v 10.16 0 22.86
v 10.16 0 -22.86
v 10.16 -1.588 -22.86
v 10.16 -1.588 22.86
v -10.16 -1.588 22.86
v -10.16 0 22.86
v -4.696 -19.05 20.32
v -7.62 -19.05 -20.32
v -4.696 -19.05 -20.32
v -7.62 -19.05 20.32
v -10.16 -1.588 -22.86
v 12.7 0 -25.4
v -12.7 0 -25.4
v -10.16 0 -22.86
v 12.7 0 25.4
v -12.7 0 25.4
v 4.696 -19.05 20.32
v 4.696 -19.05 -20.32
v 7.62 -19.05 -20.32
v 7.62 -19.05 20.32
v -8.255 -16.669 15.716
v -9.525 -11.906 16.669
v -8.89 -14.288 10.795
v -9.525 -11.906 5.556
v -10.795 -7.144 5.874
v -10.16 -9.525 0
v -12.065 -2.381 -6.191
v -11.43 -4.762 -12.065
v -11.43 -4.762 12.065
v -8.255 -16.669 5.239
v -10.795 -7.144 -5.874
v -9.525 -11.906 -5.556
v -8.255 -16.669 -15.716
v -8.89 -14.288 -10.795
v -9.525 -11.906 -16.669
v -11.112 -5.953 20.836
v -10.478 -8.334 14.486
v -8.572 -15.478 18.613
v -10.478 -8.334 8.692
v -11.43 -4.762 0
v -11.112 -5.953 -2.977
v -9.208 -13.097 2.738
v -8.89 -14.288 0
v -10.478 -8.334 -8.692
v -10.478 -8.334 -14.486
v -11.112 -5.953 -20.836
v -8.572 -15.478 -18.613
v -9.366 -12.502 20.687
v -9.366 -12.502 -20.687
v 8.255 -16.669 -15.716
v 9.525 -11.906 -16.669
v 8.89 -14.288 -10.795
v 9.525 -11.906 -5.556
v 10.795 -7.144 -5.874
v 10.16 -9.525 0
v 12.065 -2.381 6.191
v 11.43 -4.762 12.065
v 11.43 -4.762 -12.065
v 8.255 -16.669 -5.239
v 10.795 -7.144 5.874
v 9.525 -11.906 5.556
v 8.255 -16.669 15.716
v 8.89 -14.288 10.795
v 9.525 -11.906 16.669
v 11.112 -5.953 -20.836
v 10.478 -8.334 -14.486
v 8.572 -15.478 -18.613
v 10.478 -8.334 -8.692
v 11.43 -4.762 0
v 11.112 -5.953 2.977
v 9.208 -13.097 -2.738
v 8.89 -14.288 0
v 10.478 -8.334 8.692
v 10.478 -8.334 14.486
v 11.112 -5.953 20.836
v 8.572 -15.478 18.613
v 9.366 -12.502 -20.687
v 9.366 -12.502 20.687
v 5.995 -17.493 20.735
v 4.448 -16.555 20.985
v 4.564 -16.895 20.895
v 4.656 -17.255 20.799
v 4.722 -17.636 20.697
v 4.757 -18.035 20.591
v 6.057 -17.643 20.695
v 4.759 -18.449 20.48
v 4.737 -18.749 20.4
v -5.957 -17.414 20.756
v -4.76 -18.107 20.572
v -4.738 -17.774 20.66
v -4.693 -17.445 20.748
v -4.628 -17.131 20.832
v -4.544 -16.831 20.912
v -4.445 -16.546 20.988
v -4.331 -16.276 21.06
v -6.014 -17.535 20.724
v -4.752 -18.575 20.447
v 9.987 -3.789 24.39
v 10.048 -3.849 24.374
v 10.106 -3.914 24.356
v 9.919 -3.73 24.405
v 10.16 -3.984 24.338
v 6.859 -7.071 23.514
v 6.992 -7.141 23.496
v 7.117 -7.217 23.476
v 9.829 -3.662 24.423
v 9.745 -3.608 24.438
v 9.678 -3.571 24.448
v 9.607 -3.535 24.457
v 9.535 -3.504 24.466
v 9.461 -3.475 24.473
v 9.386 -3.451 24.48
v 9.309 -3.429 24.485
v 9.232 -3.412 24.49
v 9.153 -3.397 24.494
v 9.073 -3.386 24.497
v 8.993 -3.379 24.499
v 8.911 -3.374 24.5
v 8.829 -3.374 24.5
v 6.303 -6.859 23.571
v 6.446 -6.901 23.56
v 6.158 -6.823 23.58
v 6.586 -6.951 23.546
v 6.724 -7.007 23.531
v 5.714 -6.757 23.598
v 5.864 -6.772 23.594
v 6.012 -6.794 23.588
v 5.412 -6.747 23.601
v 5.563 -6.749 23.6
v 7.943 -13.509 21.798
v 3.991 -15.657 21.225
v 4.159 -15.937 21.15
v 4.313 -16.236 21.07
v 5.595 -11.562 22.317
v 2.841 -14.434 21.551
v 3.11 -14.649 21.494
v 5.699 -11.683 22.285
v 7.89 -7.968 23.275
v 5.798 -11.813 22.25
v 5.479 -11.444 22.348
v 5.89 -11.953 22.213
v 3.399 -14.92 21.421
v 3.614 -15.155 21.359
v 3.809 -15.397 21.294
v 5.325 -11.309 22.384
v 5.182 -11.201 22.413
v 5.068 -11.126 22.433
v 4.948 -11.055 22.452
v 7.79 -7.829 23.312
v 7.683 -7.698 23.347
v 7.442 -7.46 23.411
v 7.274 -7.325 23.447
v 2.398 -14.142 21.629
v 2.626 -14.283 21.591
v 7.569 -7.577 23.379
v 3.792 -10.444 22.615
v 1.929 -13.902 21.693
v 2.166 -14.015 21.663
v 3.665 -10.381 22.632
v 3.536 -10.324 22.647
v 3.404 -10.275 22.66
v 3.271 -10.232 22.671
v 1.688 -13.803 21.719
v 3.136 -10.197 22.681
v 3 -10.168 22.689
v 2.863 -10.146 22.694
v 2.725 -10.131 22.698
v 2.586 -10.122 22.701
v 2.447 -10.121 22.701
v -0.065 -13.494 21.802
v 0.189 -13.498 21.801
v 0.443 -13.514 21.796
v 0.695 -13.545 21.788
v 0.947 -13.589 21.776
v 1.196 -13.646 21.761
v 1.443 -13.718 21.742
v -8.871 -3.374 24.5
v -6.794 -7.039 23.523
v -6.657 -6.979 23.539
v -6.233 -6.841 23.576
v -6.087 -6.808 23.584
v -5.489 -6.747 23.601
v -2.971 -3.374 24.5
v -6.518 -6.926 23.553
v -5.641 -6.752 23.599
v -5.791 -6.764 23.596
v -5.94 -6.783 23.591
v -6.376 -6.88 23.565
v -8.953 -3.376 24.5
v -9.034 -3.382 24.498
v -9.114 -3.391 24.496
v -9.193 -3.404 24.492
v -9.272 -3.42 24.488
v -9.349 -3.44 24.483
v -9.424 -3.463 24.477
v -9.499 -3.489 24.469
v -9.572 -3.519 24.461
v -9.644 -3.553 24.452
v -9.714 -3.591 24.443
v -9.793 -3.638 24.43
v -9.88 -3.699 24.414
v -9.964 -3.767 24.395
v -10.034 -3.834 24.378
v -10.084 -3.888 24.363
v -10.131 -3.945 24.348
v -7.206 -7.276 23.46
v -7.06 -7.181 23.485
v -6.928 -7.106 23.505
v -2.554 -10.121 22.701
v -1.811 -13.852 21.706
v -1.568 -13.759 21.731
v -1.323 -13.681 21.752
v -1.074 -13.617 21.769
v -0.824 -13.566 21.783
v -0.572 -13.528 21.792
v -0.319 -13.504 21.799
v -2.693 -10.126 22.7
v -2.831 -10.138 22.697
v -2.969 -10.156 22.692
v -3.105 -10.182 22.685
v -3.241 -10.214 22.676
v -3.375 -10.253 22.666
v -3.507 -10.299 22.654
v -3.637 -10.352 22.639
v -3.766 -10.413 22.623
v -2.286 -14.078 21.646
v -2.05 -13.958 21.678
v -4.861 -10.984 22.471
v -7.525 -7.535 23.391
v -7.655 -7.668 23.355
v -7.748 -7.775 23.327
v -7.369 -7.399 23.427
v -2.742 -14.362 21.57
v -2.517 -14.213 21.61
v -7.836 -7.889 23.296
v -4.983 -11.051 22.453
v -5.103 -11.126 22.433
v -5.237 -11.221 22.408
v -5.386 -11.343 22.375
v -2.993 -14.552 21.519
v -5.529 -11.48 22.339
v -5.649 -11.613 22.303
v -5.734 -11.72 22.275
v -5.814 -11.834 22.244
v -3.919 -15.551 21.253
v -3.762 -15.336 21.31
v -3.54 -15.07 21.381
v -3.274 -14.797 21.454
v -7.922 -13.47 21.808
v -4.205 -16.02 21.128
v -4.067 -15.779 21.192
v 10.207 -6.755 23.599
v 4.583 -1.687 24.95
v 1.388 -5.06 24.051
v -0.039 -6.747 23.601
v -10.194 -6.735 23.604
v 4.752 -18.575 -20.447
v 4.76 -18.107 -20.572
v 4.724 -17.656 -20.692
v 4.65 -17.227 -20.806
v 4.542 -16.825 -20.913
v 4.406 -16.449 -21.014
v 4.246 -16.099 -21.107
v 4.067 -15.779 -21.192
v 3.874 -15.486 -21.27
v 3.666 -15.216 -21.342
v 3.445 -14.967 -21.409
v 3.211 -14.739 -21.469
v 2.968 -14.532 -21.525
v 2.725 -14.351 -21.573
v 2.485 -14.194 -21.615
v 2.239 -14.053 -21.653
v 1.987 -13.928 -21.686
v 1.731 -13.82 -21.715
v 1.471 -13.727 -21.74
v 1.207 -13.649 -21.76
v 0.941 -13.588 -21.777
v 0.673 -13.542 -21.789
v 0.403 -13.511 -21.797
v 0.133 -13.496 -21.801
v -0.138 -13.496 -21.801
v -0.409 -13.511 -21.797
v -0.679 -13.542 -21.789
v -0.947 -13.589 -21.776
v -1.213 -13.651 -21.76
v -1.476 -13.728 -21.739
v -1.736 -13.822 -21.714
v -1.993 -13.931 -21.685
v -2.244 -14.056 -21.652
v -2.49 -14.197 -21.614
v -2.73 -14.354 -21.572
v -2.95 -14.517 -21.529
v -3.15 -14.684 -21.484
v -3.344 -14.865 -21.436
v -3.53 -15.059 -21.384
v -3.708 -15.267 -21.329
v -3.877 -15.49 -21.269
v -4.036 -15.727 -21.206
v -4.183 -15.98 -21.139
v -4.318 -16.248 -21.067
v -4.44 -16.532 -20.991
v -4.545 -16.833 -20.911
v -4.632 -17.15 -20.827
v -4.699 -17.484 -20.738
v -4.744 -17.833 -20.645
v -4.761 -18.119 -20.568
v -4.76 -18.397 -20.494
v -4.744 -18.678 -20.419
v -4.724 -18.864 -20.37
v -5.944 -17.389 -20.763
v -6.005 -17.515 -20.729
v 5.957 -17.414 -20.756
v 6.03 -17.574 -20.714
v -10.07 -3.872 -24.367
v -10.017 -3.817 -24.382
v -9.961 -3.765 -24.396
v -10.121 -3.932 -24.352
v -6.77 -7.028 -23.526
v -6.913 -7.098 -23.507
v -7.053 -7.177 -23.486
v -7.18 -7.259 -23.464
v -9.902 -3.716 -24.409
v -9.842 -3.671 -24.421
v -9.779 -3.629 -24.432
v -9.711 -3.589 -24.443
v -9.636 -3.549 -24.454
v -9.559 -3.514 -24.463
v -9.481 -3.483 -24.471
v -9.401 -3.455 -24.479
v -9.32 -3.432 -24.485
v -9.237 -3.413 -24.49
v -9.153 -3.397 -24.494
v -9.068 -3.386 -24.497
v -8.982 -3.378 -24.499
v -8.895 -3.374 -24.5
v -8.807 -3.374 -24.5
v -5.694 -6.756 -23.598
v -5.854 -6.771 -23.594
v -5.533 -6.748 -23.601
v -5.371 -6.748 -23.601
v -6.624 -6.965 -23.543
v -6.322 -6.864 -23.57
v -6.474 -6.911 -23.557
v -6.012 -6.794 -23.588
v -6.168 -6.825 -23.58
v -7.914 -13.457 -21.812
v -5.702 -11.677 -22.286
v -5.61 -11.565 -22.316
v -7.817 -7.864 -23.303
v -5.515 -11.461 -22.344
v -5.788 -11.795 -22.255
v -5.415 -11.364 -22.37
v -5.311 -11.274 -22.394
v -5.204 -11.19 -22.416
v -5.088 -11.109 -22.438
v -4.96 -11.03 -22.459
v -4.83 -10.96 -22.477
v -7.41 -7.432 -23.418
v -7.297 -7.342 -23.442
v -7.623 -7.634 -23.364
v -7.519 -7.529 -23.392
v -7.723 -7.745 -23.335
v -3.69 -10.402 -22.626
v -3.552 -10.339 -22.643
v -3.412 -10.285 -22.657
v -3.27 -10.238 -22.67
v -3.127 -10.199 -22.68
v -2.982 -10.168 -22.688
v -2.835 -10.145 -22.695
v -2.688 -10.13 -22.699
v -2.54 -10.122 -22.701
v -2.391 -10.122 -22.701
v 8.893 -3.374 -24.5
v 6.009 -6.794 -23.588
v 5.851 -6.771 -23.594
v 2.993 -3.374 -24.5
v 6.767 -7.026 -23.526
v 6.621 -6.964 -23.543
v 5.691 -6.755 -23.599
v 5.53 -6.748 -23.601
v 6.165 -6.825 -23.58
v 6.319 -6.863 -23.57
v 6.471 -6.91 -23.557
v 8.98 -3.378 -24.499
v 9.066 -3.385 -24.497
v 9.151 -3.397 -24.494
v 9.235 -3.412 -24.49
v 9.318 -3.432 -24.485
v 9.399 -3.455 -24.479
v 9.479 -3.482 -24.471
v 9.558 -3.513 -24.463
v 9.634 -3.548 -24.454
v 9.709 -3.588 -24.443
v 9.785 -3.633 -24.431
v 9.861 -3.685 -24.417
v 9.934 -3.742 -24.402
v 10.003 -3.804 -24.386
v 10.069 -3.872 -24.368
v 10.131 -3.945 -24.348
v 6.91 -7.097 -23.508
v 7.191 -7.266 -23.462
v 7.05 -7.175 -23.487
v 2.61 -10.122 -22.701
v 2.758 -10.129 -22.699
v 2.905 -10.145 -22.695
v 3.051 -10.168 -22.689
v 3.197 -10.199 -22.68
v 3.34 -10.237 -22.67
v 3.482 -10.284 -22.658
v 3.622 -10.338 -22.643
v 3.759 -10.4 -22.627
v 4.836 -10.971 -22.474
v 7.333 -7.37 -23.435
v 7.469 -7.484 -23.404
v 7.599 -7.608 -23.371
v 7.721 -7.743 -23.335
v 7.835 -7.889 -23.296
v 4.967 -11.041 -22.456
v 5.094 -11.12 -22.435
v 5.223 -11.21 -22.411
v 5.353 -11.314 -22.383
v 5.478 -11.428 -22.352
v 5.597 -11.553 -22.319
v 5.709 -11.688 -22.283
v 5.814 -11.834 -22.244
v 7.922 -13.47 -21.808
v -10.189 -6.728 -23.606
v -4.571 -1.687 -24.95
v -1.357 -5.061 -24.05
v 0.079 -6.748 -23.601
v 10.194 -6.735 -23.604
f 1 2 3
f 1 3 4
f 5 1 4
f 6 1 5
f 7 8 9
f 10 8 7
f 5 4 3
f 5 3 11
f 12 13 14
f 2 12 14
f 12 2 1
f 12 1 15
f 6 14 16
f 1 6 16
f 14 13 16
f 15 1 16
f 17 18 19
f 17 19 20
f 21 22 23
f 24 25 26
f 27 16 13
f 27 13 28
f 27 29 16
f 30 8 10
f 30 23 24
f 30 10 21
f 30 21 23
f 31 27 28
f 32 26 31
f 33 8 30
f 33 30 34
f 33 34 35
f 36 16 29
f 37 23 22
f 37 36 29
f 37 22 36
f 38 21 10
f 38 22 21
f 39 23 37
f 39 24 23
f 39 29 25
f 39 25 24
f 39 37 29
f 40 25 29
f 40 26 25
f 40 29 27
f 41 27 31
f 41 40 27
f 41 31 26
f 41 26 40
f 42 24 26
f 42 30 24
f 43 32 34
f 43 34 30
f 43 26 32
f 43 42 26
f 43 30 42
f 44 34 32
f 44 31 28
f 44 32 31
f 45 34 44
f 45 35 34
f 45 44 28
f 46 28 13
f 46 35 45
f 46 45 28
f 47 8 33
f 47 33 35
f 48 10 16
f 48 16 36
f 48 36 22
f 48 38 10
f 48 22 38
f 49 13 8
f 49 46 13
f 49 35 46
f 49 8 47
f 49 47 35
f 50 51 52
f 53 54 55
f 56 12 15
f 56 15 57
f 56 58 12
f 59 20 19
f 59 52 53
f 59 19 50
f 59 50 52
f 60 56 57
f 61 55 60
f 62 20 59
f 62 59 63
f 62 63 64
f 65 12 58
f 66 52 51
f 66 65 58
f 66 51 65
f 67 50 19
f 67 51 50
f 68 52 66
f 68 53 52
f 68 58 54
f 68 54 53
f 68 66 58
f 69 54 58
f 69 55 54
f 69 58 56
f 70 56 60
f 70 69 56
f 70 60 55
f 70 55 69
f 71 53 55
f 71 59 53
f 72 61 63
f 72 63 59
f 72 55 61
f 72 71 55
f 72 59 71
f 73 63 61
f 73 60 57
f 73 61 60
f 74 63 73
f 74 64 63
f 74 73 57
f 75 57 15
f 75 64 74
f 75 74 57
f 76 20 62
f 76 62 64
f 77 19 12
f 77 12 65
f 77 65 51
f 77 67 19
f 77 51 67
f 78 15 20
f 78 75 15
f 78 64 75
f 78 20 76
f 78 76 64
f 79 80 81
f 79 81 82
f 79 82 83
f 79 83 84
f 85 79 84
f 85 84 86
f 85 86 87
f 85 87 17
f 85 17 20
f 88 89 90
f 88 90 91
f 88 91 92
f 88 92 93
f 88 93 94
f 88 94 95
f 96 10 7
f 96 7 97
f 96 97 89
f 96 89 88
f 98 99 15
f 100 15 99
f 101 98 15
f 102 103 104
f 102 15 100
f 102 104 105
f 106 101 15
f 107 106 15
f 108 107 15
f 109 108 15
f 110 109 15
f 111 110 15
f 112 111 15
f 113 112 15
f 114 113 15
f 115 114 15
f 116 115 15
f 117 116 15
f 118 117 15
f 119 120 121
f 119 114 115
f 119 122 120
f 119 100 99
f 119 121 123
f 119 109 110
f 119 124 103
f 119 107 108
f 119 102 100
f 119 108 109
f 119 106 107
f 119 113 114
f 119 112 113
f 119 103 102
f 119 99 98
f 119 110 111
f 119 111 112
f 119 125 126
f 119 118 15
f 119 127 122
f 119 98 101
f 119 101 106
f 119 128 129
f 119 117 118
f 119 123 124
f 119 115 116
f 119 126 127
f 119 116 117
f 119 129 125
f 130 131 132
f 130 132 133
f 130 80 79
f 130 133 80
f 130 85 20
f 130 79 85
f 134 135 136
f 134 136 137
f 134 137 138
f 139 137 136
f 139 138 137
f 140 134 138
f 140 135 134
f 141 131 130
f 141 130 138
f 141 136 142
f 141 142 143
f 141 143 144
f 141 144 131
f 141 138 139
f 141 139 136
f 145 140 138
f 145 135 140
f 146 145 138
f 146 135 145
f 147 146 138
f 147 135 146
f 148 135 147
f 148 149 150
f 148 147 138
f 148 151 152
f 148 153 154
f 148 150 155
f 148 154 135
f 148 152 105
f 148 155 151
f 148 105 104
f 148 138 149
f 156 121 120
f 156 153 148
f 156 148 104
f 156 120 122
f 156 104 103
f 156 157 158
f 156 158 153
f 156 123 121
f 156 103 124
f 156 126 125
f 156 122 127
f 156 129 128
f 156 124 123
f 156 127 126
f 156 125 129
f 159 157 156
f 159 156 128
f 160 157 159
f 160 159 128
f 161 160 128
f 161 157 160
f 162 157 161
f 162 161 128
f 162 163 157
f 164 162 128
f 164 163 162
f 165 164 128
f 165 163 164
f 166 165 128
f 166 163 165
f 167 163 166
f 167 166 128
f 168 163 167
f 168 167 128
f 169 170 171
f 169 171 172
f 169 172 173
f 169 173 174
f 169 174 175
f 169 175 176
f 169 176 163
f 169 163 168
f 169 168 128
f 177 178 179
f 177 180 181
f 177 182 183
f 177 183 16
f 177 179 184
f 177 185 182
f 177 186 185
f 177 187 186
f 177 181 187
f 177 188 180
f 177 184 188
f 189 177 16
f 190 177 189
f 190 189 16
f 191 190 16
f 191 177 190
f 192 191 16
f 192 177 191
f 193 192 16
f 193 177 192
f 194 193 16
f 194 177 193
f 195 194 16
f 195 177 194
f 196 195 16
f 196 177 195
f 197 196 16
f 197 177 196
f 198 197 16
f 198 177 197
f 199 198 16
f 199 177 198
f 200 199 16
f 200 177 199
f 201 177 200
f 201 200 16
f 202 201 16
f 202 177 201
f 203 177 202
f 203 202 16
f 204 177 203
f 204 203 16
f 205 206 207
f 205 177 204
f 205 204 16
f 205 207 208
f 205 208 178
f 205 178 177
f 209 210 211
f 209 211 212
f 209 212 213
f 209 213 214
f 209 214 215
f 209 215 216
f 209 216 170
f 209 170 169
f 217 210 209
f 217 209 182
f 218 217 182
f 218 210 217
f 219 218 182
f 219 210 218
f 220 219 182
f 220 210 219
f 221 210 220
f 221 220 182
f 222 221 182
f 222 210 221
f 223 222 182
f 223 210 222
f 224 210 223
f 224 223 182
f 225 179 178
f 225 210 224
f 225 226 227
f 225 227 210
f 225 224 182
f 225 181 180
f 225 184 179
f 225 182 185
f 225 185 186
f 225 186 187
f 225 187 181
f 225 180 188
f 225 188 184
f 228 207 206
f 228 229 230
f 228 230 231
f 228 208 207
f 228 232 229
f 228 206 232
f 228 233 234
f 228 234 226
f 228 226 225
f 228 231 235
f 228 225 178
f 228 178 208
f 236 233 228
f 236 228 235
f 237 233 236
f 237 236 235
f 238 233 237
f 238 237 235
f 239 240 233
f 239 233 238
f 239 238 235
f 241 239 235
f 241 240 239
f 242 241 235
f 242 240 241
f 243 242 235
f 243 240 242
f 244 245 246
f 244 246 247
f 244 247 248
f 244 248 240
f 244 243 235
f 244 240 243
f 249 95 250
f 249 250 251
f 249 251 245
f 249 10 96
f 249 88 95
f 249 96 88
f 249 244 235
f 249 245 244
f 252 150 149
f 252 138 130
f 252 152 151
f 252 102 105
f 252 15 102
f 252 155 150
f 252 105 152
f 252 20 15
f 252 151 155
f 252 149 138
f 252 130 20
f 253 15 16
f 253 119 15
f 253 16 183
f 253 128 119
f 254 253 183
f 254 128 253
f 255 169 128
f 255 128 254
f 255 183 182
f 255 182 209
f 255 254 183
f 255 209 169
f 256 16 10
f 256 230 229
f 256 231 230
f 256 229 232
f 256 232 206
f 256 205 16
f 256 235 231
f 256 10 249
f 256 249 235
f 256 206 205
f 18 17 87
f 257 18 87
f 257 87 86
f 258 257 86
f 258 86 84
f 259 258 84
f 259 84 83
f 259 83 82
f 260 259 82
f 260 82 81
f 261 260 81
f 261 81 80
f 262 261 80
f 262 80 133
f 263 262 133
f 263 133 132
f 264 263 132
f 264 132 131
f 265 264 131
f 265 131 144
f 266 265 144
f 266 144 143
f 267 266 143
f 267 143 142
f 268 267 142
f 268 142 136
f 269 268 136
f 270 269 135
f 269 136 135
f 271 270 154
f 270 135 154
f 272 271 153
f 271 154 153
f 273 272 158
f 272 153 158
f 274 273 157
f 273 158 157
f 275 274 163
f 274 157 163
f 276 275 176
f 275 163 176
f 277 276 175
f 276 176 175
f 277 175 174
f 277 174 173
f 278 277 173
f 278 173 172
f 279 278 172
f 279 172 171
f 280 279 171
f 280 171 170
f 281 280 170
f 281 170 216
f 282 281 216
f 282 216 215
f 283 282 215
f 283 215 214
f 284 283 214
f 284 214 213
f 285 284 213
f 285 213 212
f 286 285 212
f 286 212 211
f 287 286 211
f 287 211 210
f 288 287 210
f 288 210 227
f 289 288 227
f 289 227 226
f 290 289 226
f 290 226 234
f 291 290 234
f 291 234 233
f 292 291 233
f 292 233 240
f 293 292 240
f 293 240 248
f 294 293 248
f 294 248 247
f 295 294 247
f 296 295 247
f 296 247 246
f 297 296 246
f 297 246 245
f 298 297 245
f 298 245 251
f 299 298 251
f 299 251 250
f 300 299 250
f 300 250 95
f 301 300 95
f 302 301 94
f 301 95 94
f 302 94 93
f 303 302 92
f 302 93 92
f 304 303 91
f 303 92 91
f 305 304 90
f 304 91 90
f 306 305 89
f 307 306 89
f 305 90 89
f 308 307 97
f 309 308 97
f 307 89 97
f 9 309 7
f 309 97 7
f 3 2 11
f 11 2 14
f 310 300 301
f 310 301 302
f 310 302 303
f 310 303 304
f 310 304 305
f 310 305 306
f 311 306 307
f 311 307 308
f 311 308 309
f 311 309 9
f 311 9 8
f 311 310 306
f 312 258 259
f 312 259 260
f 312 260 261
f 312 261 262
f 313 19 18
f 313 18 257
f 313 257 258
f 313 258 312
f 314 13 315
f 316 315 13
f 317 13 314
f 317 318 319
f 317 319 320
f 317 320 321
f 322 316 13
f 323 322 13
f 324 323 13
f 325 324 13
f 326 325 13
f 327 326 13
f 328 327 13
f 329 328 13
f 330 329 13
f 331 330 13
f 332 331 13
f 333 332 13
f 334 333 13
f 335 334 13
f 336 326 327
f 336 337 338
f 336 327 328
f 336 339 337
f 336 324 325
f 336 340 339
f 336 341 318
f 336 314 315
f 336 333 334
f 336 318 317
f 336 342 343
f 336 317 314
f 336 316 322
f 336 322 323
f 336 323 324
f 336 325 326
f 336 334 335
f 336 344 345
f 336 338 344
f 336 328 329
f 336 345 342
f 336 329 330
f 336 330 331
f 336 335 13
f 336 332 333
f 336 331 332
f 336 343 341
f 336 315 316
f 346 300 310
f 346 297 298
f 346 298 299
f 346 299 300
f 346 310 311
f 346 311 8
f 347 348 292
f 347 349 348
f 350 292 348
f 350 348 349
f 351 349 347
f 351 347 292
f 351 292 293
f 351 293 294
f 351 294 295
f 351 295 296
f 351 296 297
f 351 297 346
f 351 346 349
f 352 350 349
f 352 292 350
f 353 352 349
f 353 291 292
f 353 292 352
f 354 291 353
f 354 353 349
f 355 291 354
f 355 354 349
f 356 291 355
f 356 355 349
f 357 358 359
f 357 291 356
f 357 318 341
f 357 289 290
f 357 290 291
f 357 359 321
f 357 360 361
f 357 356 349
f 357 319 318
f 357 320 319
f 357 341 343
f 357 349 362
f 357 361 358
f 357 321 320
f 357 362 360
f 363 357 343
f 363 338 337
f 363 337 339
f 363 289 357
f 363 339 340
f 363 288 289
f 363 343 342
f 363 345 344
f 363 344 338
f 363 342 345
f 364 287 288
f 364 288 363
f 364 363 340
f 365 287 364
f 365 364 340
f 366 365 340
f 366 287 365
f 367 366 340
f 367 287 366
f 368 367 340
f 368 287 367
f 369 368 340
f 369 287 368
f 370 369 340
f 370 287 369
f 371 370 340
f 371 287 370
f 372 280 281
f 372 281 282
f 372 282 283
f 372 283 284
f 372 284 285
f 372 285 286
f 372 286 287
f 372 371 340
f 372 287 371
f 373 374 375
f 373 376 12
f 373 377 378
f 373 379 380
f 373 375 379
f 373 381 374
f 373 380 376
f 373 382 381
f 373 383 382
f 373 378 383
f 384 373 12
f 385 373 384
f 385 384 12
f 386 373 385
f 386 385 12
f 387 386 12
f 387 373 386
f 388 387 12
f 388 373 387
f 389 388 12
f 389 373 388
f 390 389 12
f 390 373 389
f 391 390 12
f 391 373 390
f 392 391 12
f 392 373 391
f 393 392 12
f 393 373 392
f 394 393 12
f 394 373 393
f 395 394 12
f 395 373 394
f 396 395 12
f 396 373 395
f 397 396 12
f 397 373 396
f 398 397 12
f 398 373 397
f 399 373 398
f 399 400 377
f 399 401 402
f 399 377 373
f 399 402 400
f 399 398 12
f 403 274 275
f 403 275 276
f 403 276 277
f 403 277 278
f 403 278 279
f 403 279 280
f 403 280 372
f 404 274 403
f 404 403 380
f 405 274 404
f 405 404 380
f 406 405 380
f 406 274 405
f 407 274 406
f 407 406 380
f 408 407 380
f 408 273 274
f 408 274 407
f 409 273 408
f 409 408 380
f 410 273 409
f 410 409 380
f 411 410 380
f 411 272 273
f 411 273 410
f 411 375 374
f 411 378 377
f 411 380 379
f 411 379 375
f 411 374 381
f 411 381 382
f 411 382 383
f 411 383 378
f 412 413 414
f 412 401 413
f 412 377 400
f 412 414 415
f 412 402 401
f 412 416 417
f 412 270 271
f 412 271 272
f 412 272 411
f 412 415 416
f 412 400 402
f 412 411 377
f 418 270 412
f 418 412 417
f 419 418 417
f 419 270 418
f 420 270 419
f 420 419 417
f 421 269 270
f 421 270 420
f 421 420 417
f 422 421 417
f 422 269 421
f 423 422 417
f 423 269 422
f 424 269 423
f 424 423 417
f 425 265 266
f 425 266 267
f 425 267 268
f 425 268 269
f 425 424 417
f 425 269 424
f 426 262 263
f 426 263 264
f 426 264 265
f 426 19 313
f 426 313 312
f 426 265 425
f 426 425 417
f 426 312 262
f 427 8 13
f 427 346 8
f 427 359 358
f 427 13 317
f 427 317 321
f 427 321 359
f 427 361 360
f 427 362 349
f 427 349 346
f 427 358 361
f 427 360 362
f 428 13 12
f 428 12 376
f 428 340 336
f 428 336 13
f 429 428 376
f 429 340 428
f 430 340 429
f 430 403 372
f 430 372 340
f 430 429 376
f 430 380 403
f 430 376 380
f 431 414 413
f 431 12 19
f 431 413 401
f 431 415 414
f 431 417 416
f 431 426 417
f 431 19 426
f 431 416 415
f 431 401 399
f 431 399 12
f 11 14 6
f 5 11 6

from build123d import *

# Parameters (mm, degrees)
F0_W     = 25.4
F0_H     = 50.8
F2_W     = 15.24
F2_H     = 40.64
F5_R     = 4.7625
F6_DEPTH = 50.801
F7_W     = 20.32
F7_H     = 45.72
F8_DEPTH = 1.5875


with BuildPart() as f3:
    # F0 (on Front) → F3 section 0
    with BuildSketch(Plane.XZ):
        Rectangle(F0_W, F0_H)
    # F2 (on offset) → F3 section 1
    with BuildSketch(Plane.XZ.offset(19.05)):
        Rectangle(F2_W, F2_H)
    loft()

    # F5 (on face) → F6 (cut, through all)
    with BuildSketch(Plane.XY.offset(25.4)):
        with Locations((0, -18.25625)):
            Circle(F5_R)
    extrude(amount=-F6_DEPTH, mode=Mode.SUBTRACT)

    # F7 (on face) → F8 (cut)
    with BuildSketch(Plane(origin=(0, 0, 0), x_dir=(-1, 0, 0), z_dir=(0, 1, 0))):
        Rectangle(F7_W, F7_H)
    extrude(amount=-F8_DEPTH, mode=Mode.SUBTRACT)


solid = f3.part
